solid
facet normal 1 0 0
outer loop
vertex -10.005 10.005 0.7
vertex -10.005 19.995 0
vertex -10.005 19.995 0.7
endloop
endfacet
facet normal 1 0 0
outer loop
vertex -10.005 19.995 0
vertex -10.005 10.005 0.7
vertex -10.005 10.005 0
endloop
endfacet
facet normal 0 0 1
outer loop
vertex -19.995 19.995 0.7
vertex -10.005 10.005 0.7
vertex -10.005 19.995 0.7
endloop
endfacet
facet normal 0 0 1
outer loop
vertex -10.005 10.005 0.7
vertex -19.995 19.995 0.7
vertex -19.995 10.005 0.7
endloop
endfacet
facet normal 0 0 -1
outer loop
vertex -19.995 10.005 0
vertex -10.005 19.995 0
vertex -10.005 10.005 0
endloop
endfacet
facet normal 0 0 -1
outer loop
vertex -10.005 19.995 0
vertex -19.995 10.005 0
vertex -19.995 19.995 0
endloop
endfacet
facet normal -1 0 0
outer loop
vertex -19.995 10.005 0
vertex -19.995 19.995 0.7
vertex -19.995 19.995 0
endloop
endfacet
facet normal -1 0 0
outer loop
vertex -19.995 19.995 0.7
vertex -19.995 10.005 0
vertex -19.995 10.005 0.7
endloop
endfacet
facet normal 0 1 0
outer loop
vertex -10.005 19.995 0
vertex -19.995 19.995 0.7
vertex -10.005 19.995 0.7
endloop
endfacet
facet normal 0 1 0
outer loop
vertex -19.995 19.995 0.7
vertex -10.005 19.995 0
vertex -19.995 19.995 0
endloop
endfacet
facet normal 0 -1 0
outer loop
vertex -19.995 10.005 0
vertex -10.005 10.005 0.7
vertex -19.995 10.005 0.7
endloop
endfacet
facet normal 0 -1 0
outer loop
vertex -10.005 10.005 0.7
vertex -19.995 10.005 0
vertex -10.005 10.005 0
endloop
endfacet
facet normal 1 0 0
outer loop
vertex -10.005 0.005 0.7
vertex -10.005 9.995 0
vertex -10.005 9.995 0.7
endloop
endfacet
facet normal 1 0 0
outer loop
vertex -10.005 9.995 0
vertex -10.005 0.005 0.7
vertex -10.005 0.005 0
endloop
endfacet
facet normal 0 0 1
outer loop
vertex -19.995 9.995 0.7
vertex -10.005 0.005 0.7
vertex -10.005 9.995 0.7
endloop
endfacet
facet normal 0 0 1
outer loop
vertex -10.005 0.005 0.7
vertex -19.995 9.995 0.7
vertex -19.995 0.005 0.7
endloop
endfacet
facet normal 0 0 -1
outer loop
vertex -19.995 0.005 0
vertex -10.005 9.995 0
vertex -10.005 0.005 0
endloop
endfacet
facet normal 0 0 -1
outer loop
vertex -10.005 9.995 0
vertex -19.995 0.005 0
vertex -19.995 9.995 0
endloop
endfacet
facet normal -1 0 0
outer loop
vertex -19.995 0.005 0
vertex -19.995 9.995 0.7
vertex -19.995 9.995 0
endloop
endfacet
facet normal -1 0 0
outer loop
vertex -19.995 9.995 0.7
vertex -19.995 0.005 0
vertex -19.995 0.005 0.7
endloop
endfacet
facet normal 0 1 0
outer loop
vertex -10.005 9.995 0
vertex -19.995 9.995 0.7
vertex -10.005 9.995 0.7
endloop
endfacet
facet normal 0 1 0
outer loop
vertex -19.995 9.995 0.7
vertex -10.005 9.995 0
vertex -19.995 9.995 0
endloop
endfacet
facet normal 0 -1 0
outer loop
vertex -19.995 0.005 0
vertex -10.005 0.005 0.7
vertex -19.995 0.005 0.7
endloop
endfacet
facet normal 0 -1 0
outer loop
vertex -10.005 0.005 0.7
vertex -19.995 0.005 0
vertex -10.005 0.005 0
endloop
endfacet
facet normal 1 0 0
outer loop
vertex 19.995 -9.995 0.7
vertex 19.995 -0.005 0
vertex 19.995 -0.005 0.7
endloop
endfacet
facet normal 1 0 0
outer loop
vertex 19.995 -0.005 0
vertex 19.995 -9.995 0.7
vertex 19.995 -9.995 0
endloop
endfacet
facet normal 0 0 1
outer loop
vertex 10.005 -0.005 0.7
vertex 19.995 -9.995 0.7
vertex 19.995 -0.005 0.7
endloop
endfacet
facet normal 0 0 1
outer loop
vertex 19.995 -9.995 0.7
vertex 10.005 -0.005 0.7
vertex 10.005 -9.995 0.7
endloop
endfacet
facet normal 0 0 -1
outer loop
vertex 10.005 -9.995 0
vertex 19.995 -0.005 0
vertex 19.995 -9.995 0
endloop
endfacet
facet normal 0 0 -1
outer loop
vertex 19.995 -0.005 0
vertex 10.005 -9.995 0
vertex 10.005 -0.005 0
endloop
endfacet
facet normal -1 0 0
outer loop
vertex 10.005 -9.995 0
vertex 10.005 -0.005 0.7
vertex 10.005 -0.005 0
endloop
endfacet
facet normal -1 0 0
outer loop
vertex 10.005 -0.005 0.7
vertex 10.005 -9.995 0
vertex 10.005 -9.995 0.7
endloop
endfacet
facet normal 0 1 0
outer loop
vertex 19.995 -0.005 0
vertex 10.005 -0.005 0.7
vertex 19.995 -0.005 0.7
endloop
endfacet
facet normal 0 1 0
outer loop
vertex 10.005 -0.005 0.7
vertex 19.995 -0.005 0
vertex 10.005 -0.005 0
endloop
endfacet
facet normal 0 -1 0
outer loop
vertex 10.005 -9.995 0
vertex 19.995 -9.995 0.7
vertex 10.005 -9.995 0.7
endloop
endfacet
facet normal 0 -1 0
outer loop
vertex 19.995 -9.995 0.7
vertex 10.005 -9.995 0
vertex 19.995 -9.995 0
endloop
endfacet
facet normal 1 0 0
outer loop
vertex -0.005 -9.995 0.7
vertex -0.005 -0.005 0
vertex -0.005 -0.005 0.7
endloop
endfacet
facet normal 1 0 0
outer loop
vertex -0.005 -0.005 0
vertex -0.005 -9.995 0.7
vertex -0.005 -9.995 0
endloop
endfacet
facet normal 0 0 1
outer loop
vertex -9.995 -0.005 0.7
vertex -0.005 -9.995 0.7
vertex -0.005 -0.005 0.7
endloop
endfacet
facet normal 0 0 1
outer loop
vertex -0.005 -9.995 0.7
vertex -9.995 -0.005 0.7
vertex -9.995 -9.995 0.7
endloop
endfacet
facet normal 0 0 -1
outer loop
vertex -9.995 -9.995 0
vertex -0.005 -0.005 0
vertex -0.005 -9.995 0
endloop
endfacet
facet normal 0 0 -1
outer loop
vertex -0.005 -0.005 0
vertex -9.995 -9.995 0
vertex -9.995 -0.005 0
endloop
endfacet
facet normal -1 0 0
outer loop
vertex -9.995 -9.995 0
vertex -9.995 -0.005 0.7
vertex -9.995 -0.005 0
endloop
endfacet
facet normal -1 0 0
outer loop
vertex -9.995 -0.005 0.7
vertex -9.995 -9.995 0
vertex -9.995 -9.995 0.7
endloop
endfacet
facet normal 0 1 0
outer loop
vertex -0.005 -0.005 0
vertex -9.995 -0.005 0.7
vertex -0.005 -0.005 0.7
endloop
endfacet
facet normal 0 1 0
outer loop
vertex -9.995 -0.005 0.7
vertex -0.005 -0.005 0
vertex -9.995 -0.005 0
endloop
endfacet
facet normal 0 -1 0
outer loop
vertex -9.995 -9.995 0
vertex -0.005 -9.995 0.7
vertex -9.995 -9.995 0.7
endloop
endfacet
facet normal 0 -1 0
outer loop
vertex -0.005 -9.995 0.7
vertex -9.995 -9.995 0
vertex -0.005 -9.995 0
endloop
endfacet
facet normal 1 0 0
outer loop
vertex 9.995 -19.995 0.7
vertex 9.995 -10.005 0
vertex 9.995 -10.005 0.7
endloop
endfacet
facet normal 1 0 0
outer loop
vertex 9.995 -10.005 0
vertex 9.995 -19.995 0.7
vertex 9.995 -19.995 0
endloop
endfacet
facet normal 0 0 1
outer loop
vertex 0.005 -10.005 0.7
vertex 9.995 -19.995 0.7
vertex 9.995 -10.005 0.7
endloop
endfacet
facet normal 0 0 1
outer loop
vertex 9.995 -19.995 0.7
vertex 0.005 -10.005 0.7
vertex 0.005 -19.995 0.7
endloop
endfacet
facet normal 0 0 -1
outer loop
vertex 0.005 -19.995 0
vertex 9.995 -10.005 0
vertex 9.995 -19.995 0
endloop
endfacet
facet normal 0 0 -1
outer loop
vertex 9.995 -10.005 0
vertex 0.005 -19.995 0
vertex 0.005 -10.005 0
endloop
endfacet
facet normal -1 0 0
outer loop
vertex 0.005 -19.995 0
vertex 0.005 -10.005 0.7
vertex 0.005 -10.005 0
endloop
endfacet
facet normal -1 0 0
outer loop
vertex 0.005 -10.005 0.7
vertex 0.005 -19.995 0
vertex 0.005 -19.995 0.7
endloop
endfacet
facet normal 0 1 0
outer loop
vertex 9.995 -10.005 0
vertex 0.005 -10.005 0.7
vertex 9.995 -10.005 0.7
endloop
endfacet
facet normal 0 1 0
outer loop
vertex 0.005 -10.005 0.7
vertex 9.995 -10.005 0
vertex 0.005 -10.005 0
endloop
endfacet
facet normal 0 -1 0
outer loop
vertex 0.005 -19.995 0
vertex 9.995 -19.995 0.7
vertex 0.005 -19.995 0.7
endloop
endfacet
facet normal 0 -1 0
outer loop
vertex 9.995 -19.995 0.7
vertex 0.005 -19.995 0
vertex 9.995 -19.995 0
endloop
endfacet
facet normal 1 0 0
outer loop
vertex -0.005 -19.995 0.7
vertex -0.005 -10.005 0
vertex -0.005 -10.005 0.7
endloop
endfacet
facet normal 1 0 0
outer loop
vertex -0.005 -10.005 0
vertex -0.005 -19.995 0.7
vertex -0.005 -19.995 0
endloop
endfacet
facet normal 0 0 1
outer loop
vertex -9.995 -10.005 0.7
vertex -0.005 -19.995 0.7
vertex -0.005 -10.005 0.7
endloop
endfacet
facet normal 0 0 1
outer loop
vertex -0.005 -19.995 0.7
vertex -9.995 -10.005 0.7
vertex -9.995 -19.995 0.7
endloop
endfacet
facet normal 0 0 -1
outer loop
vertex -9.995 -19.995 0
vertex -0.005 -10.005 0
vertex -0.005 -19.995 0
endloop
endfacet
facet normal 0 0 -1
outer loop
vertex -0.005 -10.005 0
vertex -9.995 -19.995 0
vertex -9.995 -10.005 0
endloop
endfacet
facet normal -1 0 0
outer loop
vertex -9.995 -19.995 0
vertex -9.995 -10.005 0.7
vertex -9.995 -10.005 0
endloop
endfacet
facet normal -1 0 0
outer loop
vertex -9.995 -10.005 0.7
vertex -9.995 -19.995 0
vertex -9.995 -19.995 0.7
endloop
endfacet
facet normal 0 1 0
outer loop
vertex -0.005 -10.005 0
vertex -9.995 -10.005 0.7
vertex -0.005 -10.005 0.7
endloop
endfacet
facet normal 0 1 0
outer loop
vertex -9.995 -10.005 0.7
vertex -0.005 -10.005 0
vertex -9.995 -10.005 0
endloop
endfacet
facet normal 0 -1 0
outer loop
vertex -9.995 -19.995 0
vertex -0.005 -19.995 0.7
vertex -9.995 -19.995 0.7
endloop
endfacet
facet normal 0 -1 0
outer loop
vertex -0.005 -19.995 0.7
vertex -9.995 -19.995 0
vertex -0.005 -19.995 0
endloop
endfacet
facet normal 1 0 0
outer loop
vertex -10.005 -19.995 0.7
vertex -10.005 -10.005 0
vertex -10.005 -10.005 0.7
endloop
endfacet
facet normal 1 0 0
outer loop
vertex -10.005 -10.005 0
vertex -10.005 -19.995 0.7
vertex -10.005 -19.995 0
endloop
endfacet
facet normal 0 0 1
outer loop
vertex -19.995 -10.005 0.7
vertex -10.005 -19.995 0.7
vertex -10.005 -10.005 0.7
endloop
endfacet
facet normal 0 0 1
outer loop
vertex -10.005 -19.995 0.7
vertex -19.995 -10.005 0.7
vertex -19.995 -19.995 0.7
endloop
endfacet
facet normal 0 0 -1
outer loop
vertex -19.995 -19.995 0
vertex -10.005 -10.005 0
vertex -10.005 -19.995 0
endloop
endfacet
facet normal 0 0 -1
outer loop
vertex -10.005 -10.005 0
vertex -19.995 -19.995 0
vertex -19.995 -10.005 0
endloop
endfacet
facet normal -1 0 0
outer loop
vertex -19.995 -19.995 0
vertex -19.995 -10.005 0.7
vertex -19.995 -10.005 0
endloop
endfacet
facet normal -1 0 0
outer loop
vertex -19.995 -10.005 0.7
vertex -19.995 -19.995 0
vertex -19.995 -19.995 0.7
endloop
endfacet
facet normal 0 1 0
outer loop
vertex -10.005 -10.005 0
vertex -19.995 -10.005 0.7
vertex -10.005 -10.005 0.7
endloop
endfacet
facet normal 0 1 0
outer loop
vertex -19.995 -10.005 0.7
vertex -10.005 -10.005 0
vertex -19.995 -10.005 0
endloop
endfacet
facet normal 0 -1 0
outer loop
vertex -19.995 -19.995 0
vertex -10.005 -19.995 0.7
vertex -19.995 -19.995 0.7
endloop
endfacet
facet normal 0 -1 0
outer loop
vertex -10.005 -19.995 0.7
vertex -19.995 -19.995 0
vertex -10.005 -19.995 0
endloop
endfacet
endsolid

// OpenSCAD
union()
{
  translate([-15.0, 15.0, 0.35]) cube([9.99, 9.99, 0.7], center=true);
  translate([-15.0, 5.0, 0.35]) cube([9.99, 9.99, 0.7], center=true);
  translate([15.0, -5.0, 0.35]) cube([9.99, 9.99, 0.7], center=true);
  translate([-5.0, -5.0, 0.35]) cube([9.99, 9.99, 0.7], center=true);
  translate([5.0, -15.0, 0.35]) cube([9.99, 9.99, 0.7], center=true);
  translate([-5.0, -15.0, 0.35]) cube([9.99, 9.99, 0.7], center=true);
  translate([-15.0, -15.0, 0.35]) cube([9.99, 9.99, 0.7], center=true);
}
